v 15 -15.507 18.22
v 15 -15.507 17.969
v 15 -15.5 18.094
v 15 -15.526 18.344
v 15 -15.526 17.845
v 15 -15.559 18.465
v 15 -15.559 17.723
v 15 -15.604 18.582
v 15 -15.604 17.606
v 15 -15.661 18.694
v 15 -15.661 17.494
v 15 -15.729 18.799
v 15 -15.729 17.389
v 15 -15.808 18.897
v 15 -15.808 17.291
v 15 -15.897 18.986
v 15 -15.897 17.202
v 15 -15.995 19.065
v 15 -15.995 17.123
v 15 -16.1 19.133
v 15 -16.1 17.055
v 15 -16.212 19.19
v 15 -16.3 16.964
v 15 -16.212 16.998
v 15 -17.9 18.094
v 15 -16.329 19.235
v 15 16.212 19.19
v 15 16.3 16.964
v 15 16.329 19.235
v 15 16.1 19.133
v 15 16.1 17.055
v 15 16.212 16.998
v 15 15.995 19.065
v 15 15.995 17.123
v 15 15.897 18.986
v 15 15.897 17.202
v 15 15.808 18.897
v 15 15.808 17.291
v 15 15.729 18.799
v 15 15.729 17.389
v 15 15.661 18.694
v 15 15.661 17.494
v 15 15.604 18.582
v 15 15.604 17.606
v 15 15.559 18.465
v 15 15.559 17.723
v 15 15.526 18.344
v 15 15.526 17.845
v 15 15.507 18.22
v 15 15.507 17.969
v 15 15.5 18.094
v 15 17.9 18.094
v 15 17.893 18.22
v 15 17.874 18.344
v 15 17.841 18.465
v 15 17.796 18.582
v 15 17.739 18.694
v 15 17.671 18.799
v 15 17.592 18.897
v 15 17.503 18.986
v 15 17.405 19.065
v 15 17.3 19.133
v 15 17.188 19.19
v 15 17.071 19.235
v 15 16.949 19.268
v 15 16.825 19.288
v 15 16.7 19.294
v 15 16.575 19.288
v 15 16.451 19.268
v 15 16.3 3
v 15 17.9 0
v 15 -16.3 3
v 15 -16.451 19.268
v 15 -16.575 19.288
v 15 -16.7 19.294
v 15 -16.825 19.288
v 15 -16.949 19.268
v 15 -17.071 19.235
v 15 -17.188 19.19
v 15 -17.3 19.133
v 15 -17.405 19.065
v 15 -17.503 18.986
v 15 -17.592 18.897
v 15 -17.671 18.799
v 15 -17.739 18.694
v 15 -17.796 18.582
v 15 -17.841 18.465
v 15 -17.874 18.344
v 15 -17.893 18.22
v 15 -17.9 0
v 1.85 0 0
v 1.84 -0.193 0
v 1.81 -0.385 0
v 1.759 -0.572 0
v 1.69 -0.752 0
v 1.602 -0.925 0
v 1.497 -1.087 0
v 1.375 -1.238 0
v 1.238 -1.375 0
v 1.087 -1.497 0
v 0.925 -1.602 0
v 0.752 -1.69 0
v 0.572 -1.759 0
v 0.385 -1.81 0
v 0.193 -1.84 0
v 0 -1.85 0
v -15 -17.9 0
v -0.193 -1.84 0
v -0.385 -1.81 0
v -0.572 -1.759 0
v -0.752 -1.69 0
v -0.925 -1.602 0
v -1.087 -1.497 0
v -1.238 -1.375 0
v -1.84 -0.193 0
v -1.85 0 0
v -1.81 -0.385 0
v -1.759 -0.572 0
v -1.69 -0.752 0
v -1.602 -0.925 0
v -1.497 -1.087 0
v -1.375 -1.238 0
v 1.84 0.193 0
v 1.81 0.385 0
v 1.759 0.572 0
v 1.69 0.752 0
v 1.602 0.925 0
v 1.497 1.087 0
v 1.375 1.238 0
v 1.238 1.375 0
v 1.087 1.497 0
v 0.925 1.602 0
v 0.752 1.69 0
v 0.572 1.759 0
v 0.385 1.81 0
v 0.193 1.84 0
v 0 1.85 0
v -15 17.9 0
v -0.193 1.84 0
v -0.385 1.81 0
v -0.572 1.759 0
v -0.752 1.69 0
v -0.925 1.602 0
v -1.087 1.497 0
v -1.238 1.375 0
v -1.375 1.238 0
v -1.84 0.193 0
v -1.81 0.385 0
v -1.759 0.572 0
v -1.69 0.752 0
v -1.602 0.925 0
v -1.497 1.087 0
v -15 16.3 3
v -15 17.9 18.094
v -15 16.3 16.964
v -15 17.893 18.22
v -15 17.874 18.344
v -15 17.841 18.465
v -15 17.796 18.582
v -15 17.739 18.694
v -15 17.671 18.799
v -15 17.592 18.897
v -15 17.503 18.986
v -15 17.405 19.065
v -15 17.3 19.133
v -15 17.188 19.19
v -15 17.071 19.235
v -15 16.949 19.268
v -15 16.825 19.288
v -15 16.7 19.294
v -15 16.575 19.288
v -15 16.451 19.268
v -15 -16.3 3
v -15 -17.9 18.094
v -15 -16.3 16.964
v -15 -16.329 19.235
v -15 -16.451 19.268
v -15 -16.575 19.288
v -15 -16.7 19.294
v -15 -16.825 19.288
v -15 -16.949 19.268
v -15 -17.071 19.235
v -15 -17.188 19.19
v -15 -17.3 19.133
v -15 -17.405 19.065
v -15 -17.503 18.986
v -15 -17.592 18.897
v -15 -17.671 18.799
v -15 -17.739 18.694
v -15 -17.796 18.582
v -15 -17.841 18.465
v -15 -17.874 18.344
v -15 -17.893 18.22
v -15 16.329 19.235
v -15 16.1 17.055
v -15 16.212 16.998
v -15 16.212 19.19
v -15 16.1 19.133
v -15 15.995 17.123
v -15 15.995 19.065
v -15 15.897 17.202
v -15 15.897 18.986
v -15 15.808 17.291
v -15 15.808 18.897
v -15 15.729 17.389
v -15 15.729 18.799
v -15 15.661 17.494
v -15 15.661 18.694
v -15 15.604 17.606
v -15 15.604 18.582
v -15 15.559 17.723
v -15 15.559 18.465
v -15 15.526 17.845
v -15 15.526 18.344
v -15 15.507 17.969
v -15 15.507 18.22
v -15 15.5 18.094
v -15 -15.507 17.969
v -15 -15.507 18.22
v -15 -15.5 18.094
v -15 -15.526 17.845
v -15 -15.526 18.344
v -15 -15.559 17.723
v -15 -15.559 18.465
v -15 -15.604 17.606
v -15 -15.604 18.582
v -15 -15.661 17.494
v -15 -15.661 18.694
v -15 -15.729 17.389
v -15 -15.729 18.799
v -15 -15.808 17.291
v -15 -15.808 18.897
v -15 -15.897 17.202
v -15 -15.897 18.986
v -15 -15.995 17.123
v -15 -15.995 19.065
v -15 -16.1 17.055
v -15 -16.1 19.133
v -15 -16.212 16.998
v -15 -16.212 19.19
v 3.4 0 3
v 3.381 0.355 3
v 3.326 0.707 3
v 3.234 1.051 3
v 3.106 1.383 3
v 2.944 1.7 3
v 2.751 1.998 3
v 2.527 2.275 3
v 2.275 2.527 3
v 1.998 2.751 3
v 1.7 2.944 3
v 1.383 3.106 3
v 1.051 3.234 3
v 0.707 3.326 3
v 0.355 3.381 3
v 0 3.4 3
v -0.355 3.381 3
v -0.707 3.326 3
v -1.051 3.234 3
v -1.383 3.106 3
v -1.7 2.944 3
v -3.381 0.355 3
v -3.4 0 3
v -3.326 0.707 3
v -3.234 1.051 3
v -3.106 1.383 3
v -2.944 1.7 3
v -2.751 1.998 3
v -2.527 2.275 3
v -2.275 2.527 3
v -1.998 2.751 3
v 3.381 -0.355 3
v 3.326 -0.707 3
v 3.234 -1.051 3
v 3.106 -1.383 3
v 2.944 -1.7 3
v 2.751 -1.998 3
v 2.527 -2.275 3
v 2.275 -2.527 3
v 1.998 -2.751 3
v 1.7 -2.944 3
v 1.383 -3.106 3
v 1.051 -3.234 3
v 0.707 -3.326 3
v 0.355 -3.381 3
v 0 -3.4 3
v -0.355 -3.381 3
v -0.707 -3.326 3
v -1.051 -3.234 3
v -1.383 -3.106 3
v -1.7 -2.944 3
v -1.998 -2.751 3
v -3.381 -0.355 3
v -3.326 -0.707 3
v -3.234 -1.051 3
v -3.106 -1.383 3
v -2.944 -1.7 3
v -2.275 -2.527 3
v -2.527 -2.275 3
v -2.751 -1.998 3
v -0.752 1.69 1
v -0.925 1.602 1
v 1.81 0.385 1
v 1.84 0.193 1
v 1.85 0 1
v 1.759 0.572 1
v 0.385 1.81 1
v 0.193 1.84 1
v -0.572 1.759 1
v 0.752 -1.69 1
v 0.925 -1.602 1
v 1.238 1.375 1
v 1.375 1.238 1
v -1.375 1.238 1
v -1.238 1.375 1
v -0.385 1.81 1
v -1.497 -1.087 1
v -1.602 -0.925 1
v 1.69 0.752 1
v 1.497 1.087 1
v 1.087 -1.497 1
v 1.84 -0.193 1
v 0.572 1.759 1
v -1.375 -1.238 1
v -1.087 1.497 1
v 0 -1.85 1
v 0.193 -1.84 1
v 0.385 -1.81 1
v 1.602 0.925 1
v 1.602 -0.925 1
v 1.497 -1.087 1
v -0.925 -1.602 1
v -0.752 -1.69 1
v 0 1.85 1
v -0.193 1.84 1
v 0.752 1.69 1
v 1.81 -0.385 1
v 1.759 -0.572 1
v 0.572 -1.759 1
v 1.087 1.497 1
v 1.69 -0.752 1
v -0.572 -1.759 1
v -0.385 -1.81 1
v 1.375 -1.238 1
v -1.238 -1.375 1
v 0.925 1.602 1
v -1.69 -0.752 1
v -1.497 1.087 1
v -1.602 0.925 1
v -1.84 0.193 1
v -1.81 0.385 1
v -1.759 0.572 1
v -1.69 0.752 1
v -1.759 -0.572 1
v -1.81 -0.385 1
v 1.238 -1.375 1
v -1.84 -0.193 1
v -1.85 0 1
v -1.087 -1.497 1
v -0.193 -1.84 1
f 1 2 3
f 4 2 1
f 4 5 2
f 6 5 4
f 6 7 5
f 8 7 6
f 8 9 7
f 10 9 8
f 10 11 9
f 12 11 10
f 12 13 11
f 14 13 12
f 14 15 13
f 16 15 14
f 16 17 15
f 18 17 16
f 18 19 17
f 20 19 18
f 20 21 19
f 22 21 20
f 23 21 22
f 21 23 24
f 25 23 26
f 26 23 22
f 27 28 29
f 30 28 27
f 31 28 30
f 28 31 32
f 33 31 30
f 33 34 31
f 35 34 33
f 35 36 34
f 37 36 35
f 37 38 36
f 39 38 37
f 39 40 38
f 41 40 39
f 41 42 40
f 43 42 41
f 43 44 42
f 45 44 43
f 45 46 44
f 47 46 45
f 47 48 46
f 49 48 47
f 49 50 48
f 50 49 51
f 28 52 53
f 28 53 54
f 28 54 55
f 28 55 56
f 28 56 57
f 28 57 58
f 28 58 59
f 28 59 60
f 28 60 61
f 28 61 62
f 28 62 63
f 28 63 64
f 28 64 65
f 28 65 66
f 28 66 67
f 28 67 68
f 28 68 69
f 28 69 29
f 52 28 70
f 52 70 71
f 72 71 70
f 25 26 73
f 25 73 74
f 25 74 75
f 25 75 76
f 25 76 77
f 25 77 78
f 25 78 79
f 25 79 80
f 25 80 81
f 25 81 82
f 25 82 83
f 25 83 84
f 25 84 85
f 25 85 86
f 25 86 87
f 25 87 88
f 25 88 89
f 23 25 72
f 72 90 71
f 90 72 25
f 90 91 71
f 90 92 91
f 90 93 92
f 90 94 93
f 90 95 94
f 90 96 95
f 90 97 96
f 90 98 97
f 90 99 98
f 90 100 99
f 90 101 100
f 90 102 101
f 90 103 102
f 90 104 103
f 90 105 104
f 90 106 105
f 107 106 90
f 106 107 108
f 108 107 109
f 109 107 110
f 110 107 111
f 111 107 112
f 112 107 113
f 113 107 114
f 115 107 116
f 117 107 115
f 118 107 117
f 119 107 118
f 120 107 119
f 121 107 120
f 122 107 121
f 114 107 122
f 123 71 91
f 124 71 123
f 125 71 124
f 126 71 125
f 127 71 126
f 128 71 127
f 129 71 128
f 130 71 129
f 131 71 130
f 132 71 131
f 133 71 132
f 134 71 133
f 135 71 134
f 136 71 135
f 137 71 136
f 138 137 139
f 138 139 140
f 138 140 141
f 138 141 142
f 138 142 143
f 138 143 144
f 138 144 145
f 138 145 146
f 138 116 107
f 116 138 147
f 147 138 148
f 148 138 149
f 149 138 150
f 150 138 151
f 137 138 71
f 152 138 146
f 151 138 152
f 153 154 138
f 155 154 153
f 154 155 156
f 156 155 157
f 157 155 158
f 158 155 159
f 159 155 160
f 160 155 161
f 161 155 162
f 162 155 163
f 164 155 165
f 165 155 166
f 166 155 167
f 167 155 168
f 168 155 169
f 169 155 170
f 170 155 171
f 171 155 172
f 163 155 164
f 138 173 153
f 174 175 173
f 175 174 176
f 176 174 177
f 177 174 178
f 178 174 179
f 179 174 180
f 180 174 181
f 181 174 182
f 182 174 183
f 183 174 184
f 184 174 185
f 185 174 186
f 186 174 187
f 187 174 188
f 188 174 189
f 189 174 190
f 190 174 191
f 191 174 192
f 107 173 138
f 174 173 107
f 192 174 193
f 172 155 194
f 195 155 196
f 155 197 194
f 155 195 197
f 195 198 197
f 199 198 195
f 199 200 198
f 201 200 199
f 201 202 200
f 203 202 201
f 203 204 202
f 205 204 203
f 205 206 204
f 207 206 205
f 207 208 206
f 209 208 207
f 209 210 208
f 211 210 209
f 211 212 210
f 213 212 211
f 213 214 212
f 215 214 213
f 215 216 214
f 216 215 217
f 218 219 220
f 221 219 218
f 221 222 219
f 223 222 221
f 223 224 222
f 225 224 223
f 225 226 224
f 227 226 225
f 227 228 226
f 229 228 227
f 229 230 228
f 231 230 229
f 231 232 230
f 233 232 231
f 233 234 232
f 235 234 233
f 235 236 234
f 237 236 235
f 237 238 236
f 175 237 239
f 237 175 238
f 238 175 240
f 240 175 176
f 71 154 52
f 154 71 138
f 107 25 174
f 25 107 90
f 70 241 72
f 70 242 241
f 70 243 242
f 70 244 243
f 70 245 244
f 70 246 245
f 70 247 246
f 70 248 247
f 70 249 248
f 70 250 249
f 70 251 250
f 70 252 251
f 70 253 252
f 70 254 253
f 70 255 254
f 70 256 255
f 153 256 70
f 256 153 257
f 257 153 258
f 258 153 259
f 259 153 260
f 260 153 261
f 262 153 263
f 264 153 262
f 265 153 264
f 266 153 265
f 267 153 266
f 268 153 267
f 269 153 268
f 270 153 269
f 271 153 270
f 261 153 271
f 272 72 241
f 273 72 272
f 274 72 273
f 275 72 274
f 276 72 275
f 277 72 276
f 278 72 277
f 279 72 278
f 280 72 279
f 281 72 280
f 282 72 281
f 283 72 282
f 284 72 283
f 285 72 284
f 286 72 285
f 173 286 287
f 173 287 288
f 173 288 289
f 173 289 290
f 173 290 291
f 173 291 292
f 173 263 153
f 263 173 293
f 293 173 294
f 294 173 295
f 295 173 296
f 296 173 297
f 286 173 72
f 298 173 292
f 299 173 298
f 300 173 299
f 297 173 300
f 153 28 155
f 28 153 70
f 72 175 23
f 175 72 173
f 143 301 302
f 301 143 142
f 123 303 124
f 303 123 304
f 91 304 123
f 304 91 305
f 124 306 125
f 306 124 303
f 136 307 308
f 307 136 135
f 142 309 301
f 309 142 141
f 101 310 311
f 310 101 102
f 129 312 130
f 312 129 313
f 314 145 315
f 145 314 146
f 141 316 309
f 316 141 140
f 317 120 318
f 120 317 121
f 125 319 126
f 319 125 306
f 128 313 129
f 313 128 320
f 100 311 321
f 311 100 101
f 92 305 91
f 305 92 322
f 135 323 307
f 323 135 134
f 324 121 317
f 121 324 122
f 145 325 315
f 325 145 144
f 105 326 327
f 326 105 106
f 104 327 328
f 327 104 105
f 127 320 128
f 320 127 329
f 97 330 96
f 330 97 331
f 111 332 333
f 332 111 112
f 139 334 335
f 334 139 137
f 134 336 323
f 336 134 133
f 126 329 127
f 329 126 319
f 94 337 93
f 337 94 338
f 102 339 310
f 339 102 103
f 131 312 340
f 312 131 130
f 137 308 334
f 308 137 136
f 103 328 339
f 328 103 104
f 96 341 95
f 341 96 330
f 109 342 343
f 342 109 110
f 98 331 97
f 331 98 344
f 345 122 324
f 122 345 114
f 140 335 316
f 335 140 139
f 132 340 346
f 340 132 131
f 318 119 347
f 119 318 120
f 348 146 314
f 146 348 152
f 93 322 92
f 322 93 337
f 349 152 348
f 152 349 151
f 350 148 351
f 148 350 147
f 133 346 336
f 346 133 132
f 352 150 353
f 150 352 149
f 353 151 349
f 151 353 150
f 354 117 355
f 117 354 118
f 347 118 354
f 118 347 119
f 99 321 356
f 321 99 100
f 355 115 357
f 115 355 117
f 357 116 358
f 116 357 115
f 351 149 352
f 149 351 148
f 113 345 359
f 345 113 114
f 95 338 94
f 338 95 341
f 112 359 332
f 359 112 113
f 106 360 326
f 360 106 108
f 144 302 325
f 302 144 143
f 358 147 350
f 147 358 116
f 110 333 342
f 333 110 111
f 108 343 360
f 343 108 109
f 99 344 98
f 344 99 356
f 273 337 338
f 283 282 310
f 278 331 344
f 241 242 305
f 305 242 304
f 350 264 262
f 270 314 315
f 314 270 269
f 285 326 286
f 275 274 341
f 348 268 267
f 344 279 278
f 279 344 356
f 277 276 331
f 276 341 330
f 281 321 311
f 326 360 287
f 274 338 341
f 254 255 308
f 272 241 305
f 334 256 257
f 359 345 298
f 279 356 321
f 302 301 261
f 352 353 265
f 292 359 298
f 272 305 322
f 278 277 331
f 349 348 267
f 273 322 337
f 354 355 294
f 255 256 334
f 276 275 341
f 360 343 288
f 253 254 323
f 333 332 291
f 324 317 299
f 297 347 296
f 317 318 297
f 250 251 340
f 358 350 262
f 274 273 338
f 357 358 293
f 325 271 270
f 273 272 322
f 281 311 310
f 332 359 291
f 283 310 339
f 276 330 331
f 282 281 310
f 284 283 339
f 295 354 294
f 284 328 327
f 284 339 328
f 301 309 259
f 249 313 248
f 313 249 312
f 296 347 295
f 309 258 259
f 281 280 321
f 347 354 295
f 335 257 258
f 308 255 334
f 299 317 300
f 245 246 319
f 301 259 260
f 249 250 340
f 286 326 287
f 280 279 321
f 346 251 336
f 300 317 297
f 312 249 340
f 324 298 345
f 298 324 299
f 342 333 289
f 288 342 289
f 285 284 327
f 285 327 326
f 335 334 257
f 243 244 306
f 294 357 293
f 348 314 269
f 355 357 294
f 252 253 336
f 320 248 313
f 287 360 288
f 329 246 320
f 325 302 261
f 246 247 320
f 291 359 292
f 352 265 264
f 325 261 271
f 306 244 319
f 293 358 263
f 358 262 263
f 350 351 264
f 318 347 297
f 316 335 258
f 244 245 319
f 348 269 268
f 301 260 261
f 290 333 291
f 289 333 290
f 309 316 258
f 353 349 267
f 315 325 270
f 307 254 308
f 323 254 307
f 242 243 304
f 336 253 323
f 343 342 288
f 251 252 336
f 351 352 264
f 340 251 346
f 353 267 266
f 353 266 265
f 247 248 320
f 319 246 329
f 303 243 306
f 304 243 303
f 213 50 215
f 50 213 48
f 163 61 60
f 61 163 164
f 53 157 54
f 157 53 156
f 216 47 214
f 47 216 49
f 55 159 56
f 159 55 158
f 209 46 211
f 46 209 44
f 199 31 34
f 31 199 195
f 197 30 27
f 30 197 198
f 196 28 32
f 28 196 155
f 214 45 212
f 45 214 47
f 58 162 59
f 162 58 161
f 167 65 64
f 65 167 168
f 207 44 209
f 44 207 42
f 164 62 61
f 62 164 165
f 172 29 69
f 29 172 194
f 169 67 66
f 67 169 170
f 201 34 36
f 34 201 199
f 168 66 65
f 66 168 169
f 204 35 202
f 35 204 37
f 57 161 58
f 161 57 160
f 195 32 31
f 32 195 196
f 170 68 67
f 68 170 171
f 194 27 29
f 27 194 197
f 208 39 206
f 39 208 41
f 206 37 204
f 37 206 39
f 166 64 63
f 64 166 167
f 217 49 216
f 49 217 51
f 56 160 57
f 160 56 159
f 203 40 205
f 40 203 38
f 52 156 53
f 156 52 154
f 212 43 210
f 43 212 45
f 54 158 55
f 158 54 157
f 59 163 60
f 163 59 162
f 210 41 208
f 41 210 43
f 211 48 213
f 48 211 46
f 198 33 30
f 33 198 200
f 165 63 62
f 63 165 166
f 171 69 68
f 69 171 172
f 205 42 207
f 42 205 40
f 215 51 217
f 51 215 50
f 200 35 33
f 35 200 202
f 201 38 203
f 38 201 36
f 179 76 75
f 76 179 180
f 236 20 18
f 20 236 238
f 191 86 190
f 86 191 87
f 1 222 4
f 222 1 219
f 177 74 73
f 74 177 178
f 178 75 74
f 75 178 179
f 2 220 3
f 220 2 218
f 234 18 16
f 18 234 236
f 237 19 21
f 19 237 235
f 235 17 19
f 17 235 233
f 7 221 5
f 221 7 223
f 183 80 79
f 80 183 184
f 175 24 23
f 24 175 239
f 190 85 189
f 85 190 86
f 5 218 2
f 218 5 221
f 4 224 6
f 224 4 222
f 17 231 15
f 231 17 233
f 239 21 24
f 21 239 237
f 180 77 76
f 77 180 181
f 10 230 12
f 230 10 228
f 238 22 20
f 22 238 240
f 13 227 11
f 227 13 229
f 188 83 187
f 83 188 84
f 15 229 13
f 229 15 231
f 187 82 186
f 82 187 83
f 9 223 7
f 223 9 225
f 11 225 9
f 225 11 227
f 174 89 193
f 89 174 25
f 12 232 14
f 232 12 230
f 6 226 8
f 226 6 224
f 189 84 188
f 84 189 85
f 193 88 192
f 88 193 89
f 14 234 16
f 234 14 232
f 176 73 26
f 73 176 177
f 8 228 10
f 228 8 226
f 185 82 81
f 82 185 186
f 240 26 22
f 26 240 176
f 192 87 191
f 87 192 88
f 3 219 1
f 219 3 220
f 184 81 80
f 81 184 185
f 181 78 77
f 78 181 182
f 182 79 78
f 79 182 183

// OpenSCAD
/*
 * LoRa-Connect
 *
 * Copyright (C) 2023 Richard "Shred" Körber
 *   https://codeberg.org/shred/lora-connect
 *
 * This program is free software: you can redistribute it and/or modify
 * it under the terms of the GNU General Public License as published by
 * the Free Software Foundation, either version 3 of the License, or
 * (at your option) any later version.
 *
 * This program is distributed in the hope that it will be useful,
 * but WITHOUT ANY WARRANTY; without even the implied warranty of
 * MERCHANTABILITY or FITNESS FOR A PARTICULAR PURPOSE.  See the
 * GNU General Public License for more details.
 */

innerW = 30;
innerD = 32.6;
innerH = 14.6;

screwDiam = 3.7;
headDiam = 6.8;
headHeight = 2.0;

clipDiam = 2.4;
base = 3;
wall = 1.6;

module clip() {
    rotate([0, 90, 0]) cylinder(d=clipDiam, h=innerW);
}

effectiveInnerH = innerH - (clipDiam / 1.7)/2;
recess = (clipDiam - wall)/2;

difference() {
    offsetZ = (effectiveInnerH + base + clipDiam/2)/2;
    translate([0, 0, offsetZ]) cube([innerW, innerD + wall * 2, effectiveInnerH + base + clipDiam/2], center=true);
    translate([0, 0, offsetZ + base/2]) cube([innerW, innerD, effectiveInnerH + clipDiam/2], center=true);
    cylinder(d = screwDiam, h=base);
    translate([0, 0, base - headHeight]) cylinder(d1 = screwDiam, d2=headDiam, h=headHeight);
}

translate([-innerW/2,  innerD/2 + recess, effectiveInnerH + base + clipDiam/2]) clip();
translate([-innerW/2, -innerD/2 - recess, effectiveInnerH + base + clipDiam/2]) clip();

$fn = 60;
